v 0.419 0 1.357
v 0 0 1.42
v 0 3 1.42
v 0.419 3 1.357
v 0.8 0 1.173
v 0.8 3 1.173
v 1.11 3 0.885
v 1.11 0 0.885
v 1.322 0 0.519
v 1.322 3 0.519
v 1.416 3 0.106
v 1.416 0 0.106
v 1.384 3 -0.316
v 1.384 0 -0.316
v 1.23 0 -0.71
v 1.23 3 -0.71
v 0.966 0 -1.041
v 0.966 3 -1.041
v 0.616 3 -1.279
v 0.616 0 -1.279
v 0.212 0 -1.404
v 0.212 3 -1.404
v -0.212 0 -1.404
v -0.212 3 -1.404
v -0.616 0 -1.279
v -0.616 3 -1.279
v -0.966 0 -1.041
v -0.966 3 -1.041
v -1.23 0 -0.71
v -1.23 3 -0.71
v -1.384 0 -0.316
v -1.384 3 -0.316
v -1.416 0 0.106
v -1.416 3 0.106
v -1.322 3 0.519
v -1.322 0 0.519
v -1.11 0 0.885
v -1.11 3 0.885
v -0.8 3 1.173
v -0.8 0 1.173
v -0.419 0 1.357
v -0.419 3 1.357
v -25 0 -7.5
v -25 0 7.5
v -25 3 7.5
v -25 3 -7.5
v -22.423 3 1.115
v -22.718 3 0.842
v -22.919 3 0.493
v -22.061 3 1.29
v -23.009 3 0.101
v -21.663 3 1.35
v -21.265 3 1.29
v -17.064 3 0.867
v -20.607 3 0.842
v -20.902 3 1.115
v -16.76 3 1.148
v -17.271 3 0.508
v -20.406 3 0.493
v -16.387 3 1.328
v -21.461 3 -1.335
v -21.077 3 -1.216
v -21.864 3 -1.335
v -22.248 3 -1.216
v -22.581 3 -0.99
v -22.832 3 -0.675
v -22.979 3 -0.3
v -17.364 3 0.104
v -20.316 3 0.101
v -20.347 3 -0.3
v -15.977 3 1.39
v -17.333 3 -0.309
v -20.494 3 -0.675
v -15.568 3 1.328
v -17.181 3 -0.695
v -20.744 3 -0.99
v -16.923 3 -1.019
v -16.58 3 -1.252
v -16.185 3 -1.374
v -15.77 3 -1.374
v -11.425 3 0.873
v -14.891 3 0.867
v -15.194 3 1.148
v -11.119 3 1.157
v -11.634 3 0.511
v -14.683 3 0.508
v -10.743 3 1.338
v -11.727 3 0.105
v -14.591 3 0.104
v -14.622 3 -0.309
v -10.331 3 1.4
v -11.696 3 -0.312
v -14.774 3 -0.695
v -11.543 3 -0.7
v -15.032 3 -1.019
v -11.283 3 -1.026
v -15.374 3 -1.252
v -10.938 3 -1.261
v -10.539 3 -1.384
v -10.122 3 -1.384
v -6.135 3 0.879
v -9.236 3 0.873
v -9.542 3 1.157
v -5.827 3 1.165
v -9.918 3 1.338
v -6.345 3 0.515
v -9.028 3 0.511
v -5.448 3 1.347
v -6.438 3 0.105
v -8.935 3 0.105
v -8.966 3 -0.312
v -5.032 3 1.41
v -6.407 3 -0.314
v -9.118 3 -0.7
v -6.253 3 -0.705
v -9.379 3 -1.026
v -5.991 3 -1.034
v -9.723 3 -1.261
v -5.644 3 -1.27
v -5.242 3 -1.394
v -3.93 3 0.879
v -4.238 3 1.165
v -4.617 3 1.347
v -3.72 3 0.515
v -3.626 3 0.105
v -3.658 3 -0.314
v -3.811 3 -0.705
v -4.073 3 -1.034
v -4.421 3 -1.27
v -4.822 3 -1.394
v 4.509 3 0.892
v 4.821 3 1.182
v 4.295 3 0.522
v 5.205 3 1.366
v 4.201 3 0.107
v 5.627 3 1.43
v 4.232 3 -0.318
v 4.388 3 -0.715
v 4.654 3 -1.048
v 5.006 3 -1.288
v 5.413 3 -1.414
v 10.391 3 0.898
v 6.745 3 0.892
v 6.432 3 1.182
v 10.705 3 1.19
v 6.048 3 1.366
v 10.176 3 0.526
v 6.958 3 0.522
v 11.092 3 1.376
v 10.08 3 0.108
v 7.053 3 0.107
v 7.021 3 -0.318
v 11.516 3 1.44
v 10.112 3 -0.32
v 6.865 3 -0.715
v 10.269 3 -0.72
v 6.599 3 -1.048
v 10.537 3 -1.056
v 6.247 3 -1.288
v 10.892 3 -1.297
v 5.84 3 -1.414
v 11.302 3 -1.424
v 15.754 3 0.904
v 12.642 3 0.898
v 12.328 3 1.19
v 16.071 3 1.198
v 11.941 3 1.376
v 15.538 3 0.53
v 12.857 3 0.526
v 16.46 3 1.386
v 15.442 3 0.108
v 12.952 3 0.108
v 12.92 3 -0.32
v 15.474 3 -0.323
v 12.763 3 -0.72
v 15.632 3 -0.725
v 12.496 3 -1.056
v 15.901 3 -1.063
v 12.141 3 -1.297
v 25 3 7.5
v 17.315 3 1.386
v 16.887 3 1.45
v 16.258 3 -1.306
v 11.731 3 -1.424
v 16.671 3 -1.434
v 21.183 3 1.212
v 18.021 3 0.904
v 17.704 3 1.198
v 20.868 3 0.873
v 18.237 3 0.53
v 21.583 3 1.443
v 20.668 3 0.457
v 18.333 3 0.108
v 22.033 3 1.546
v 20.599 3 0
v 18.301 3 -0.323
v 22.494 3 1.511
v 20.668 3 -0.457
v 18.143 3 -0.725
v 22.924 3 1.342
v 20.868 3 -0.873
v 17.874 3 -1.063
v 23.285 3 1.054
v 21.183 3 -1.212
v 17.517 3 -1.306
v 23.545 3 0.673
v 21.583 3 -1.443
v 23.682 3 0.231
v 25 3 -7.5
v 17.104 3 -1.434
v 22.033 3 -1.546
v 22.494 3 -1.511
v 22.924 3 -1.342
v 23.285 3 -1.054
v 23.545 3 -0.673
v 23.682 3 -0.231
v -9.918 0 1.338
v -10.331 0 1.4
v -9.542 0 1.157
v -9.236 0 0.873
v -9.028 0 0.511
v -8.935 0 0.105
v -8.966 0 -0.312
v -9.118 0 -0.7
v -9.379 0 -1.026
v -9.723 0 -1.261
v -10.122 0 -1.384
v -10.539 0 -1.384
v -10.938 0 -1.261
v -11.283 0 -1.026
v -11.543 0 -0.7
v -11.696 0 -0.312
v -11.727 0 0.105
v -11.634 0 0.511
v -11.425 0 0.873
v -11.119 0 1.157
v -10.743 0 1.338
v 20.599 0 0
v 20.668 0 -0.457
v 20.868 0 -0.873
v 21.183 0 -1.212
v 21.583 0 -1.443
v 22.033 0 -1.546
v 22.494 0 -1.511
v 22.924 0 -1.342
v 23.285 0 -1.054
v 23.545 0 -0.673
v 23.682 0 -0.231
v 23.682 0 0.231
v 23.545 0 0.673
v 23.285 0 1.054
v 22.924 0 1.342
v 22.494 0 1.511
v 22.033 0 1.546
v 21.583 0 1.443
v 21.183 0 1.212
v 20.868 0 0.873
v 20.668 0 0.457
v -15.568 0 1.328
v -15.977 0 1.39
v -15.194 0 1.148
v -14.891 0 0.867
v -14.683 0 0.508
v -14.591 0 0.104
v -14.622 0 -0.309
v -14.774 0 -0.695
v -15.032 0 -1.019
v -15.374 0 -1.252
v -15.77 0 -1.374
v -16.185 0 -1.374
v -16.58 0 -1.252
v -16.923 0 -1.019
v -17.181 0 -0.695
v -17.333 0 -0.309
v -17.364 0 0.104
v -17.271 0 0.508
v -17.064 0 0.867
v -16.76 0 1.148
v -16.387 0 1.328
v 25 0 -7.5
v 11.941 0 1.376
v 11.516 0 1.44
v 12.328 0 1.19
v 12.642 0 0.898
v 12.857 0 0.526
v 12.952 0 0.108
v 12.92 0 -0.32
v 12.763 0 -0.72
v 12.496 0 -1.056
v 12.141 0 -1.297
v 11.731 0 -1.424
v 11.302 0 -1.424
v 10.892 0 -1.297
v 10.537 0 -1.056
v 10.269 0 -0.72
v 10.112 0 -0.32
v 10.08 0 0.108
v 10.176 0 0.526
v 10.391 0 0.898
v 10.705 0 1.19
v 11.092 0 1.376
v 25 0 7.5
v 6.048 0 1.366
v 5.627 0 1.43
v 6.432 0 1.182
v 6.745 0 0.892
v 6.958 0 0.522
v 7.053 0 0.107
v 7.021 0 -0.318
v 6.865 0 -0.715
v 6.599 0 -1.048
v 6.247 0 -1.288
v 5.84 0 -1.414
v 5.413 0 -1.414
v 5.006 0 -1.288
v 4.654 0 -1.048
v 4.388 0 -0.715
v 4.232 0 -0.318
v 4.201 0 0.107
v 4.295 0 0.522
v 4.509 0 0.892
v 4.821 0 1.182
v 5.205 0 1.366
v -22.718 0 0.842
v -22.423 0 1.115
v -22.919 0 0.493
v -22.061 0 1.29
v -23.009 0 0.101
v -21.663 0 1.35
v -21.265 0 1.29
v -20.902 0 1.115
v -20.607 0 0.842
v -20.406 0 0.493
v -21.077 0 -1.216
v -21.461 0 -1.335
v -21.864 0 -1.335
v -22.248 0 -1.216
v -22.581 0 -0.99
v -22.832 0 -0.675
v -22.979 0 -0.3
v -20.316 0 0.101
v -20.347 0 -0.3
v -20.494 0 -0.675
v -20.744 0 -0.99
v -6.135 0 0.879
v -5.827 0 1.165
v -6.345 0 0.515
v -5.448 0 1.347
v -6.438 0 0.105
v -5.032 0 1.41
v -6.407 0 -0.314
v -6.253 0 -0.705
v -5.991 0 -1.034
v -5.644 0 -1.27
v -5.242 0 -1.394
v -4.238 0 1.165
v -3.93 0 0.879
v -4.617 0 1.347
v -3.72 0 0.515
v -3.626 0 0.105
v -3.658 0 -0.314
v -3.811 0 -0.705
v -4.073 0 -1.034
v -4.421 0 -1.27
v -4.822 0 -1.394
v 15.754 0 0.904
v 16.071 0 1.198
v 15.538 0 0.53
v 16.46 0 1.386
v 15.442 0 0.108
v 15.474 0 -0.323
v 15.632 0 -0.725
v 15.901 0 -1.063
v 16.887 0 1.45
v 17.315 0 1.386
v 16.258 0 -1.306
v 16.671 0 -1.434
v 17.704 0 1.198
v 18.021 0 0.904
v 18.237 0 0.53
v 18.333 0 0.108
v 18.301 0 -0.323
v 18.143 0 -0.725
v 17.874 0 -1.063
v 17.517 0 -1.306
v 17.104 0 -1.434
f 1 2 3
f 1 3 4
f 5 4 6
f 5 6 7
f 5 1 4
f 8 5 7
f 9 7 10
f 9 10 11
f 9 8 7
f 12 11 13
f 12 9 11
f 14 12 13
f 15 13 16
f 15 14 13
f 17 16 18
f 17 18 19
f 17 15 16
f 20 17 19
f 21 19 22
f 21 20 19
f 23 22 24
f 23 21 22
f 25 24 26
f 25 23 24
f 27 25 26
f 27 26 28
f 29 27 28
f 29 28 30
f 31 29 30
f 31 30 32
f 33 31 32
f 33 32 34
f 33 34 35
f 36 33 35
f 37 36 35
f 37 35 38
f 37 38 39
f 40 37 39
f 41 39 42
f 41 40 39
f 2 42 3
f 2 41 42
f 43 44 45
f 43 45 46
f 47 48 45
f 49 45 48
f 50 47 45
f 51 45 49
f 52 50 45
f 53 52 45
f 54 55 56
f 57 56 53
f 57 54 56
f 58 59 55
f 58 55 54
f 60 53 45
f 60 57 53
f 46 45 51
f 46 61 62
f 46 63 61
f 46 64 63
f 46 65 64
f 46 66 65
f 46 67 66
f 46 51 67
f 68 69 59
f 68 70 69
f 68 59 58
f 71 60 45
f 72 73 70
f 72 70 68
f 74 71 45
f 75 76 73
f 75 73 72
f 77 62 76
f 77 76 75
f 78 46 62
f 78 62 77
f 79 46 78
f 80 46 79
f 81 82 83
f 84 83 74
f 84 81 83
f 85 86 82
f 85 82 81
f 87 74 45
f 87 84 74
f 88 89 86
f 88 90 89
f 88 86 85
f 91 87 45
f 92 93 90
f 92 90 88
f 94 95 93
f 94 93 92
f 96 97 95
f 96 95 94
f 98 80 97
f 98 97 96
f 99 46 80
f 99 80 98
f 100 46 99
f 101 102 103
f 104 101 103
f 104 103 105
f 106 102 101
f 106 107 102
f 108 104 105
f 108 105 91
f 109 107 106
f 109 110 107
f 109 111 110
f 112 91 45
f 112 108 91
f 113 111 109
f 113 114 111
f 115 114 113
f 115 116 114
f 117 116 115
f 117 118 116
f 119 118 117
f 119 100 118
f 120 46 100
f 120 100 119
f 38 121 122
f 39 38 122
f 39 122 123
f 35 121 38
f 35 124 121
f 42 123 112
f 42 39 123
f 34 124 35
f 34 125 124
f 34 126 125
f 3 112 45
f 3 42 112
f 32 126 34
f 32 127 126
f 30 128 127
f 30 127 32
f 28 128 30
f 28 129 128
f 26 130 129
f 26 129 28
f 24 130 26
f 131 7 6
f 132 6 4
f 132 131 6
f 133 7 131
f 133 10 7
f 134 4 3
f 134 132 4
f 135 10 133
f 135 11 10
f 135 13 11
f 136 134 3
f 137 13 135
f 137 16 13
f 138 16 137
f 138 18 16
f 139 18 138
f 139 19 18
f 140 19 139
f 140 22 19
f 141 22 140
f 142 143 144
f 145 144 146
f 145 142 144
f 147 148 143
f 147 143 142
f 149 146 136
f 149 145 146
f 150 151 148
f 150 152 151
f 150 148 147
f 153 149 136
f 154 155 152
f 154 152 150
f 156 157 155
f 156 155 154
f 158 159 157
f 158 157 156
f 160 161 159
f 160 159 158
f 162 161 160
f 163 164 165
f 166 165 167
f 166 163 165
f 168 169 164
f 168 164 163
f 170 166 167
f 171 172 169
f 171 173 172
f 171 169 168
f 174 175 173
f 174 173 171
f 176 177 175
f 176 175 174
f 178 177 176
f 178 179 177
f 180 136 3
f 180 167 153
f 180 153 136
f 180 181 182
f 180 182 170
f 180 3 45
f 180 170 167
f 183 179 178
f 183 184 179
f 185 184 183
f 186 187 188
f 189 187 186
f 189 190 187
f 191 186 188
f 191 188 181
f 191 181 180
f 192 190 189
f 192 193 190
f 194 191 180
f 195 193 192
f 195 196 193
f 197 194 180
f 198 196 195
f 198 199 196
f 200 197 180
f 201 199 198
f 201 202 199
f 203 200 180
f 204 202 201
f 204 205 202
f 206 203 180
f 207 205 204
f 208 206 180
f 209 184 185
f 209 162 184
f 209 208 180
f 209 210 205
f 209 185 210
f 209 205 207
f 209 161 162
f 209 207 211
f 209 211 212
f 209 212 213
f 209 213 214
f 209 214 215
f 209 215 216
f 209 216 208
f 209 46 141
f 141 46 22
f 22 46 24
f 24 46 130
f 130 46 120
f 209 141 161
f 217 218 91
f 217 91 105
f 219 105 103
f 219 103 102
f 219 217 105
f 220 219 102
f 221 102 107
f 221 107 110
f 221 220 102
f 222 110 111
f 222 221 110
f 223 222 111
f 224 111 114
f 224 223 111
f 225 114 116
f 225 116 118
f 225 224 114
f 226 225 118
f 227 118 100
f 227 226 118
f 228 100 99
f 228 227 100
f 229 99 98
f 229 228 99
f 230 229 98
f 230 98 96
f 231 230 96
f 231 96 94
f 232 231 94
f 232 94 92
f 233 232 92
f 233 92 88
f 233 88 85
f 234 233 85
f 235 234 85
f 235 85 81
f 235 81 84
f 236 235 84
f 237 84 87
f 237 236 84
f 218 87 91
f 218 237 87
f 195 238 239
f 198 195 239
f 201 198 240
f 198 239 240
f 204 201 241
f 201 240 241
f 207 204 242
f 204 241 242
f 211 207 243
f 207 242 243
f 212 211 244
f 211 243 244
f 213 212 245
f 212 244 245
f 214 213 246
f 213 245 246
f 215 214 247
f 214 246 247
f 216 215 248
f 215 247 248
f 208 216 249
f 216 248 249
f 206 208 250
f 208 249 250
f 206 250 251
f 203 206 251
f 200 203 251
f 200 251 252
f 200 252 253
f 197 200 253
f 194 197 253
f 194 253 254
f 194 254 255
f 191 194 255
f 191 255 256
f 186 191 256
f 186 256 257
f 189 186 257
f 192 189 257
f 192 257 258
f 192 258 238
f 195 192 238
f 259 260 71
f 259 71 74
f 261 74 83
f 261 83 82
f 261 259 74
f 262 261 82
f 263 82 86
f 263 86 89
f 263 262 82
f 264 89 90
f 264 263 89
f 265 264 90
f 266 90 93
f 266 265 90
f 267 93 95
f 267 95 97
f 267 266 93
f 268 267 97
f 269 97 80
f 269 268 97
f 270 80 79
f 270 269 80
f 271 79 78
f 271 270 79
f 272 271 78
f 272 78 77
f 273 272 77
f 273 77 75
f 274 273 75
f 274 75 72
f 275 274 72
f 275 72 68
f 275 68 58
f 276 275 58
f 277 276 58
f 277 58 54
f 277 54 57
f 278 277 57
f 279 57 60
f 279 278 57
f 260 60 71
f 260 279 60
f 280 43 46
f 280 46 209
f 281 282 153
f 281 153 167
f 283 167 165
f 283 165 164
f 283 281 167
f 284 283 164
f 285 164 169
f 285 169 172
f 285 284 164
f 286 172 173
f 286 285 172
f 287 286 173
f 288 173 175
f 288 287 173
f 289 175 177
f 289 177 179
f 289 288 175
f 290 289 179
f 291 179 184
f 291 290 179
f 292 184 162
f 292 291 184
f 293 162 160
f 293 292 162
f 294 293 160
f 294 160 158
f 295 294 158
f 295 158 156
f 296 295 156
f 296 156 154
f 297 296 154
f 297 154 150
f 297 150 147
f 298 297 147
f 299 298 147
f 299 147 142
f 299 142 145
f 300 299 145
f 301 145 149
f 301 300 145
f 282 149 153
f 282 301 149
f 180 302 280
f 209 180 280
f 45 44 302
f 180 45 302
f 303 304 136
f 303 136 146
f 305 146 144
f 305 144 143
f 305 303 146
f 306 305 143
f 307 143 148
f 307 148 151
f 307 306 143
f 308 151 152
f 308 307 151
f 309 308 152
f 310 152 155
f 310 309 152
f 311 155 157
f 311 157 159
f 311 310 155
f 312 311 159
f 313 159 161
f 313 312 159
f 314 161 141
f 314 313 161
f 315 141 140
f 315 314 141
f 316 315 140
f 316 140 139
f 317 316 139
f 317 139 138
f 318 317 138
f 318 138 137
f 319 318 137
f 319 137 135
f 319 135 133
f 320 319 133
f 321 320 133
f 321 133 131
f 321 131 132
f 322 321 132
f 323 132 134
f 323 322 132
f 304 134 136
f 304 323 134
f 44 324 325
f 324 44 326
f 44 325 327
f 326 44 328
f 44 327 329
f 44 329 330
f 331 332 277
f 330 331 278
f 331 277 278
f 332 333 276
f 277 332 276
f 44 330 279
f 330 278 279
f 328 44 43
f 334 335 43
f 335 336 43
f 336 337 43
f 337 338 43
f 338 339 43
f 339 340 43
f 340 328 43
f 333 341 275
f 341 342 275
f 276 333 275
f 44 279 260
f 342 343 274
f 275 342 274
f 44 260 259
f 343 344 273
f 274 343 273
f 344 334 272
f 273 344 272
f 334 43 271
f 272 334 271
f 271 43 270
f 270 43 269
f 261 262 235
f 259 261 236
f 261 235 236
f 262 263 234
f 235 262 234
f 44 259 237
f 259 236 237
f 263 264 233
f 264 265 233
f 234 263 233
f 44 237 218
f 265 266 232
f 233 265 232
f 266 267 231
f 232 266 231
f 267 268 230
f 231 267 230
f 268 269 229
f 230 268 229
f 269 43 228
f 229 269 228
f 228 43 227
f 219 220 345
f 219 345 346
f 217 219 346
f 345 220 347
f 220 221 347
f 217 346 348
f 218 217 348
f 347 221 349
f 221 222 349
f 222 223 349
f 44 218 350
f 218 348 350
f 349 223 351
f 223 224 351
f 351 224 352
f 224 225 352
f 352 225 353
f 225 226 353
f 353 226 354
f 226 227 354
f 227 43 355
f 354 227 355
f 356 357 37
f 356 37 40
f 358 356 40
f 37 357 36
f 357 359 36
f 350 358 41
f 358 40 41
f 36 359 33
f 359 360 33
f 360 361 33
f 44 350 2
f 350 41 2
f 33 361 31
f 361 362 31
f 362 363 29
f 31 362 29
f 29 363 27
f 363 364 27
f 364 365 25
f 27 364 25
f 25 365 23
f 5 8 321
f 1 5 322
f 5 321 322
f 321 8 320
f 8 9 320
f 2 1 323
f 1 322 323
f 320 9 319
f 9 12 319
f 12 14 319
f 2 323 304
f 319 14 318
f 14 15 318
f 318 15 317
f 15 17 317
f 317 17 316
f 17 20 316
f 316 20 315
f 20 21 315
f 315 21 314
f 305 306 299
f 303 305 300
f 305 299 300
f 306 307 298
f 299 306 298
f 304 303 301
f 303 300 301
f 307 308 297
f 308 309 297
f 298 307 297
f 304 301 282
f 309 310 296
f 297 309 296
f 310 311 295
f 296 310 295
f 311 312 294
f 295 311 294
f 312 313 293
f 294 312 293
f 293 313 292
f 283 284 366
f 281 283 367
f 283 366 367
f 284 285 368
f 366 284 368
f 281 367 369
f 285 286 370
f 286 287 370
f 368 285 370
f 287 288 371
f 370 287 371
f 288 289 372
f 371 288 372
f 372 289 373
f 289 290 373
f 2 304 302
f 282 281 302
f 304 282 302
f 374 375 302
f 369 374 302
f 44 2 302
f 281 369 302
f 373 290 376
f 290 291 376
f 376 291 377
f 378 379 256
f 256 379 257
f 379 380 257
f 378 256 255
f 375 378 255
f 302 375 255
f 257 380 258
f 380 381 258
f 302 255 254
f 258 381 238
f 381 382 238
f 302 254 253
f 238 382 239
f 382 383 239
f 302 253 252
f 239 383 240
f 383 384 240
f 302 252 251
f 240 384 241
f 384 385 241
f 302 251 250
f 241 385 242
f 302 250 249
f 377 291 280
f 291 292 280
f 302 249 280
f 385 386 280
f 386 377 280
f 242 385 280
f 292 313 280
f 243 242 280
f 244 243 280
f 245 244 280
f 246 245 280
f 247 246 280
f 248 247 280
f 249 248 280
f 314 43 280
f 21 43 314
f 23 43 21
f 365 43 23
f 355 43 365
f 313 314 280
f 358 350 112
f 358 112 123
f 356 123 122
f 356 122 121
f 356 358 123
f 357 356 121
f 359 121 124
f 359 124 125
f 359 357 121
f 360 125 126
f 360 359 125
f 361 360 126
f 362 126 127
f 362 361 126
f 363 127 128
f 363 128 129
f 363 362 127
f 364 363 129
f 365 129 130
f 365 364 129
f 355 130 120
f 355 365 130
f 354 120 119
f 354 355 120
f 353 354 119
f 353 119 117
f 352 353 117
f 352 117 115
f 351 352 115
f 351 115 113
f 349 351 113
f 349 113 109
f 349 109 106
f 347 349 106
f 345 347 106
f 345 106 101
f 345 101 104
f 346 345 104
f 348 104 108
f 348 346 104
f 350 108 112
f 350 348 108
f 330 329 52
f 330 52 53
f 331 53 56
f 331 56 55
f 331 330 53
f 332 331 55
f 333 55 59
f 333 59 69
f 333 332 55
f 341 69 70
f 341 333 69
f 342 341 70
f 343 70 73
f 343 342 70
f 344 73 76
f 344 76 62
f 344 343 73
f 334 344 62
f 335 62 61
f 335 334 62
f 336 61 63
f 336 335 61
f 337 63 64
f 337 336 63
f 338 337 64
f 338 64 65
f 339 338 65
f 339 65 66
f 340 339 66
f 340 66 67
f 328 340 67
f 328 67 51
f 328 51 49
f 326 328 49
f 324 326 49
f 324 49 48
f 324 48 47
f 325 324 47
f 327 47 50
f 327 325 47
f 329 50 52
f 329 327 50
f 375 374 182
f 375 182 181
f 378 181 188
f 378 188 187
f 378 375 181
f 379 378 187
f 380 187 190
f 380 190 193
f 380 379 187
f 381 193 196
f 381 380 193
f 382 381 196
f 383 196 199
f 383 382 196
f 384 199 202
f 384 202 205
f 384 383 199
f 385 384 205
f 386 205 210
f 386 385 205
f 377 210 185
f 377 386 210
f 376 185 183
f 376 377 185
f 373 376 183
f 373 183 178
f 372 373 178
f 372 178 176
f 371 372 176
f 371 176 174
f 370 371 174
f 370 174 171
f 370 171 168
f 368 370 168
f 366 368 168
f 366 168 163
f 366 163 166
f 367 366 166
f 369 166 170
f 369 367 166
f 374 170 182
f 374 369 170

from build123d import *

# Parameters (mm, degrees)
CROQUIS1_W                         = 50
CROQUIS1_H                         = 15
CROQUIS1_R                         = 1.35
CROQUIS1_R_2                       = 1.39
CROQUIS1_R_3                       = 1.4
CROQUIS1_R_4                       = 1.41
CROQUIS1_R_5                       = 1.42
CROQUIS1_R_6                       = 1.43
CROQUIS1_R_7                       = 1.44
CROQUIS1_R_8                       = 1.45
SALIENTE_EXTRUIR1_DEPTH            = 3
TALADRO_DE_MARGEN_PARA_M2_51_D     = 3.1
TALADRO_DE_MARGEN_PARA_M2_51_DEPTH = 3.18
TALADRO_DE_MARGEN_PARA_M2_51_TIP   = 0.931333959


with BuildPart() as part:
    # Croquis1 → Saliente-Extruir1 (new body)
    with BuildSketch(Plane(origin=(0, 0, 0), x_dir=(1, 0, 0), z_dir=(0, 1, 0))):
        Rectangle(CROQUIS1_W, CROQUIS1_H)
        with Locations(Location((-21.662668198, 0, 0), (0, 0, 270))):
            Circle(CROQUIS1_R, mode=Mode.SUBTRACT)
        with Locations(Location((-15.977400582, 0, 0), (0, 0, 270))):
            Circle(CROQUIS1_R_2, mode=Mode.SUBTRACT)
        with Locations(Location((-10.330808256, 0, 0), (0, 0, 270))):
            Circle(CROQUIS1_R_3, mode=Mode.SUBTRACT)
        with Locations(Location((-5.032293538, 0, 0), (0, 0, 270))):
            Circle(CROQUIS1_R_4, mode=Mode.SUBTRACT)
        with Locations(Location((0, 0, 0), (0, 0, 270))):
            Circle(CROQUIS1_R_5, mode=Mode.SUBTRACT)
        with Locations(Location((5.626588796, 0, 0), (0, 0, 270))):
            Circle(CROQUIS1_R_6, mode=Mode.SUBTRACT)
        with Locations(Location((11.516395661, 0, 0), (0, 0, 270))):
            Circle(CROQUIS1_R_7, mode=Mode.SUBTRACT)
        with Locations(Location((16.88744942, 0, 0), (0, 0, 270))):
            Circle(CROQUIS1_R_8, mode=Mode.SUBTRACT)
    extrude(amount=SALIENTE_EXTRUIR1_DEPTH)

    # Taladro de margen para M2.51
    with Locations(Plane(origin=(0, 3, 0), x_dir=(1, 0, 0), z_dir=(0, 1, 0))):
        with Locations((22.148927614, 0)):
            Hole(TALADRO_DE_MARGEN_PARA_M2_51_D / 2, depth=TALADRO_DE_MARGEN_PARA_M2_51_DEPTH)
            with Locations((0, 0, -(TALADRO_DE_MARGEN_PARA_M2_51_DEPTH + TALADRO_DE_MARGEN_PARA_M2_51_TIP / 2))):  # 118° drill point
                Cone(0, TALADRO_DE_MARGEN_PARA_M2_51_D / 2, TALADRO_DE_MARGEN_PARA_M2_51_TIP, mode=Mode.SUBTRACT)


solid = part.part
